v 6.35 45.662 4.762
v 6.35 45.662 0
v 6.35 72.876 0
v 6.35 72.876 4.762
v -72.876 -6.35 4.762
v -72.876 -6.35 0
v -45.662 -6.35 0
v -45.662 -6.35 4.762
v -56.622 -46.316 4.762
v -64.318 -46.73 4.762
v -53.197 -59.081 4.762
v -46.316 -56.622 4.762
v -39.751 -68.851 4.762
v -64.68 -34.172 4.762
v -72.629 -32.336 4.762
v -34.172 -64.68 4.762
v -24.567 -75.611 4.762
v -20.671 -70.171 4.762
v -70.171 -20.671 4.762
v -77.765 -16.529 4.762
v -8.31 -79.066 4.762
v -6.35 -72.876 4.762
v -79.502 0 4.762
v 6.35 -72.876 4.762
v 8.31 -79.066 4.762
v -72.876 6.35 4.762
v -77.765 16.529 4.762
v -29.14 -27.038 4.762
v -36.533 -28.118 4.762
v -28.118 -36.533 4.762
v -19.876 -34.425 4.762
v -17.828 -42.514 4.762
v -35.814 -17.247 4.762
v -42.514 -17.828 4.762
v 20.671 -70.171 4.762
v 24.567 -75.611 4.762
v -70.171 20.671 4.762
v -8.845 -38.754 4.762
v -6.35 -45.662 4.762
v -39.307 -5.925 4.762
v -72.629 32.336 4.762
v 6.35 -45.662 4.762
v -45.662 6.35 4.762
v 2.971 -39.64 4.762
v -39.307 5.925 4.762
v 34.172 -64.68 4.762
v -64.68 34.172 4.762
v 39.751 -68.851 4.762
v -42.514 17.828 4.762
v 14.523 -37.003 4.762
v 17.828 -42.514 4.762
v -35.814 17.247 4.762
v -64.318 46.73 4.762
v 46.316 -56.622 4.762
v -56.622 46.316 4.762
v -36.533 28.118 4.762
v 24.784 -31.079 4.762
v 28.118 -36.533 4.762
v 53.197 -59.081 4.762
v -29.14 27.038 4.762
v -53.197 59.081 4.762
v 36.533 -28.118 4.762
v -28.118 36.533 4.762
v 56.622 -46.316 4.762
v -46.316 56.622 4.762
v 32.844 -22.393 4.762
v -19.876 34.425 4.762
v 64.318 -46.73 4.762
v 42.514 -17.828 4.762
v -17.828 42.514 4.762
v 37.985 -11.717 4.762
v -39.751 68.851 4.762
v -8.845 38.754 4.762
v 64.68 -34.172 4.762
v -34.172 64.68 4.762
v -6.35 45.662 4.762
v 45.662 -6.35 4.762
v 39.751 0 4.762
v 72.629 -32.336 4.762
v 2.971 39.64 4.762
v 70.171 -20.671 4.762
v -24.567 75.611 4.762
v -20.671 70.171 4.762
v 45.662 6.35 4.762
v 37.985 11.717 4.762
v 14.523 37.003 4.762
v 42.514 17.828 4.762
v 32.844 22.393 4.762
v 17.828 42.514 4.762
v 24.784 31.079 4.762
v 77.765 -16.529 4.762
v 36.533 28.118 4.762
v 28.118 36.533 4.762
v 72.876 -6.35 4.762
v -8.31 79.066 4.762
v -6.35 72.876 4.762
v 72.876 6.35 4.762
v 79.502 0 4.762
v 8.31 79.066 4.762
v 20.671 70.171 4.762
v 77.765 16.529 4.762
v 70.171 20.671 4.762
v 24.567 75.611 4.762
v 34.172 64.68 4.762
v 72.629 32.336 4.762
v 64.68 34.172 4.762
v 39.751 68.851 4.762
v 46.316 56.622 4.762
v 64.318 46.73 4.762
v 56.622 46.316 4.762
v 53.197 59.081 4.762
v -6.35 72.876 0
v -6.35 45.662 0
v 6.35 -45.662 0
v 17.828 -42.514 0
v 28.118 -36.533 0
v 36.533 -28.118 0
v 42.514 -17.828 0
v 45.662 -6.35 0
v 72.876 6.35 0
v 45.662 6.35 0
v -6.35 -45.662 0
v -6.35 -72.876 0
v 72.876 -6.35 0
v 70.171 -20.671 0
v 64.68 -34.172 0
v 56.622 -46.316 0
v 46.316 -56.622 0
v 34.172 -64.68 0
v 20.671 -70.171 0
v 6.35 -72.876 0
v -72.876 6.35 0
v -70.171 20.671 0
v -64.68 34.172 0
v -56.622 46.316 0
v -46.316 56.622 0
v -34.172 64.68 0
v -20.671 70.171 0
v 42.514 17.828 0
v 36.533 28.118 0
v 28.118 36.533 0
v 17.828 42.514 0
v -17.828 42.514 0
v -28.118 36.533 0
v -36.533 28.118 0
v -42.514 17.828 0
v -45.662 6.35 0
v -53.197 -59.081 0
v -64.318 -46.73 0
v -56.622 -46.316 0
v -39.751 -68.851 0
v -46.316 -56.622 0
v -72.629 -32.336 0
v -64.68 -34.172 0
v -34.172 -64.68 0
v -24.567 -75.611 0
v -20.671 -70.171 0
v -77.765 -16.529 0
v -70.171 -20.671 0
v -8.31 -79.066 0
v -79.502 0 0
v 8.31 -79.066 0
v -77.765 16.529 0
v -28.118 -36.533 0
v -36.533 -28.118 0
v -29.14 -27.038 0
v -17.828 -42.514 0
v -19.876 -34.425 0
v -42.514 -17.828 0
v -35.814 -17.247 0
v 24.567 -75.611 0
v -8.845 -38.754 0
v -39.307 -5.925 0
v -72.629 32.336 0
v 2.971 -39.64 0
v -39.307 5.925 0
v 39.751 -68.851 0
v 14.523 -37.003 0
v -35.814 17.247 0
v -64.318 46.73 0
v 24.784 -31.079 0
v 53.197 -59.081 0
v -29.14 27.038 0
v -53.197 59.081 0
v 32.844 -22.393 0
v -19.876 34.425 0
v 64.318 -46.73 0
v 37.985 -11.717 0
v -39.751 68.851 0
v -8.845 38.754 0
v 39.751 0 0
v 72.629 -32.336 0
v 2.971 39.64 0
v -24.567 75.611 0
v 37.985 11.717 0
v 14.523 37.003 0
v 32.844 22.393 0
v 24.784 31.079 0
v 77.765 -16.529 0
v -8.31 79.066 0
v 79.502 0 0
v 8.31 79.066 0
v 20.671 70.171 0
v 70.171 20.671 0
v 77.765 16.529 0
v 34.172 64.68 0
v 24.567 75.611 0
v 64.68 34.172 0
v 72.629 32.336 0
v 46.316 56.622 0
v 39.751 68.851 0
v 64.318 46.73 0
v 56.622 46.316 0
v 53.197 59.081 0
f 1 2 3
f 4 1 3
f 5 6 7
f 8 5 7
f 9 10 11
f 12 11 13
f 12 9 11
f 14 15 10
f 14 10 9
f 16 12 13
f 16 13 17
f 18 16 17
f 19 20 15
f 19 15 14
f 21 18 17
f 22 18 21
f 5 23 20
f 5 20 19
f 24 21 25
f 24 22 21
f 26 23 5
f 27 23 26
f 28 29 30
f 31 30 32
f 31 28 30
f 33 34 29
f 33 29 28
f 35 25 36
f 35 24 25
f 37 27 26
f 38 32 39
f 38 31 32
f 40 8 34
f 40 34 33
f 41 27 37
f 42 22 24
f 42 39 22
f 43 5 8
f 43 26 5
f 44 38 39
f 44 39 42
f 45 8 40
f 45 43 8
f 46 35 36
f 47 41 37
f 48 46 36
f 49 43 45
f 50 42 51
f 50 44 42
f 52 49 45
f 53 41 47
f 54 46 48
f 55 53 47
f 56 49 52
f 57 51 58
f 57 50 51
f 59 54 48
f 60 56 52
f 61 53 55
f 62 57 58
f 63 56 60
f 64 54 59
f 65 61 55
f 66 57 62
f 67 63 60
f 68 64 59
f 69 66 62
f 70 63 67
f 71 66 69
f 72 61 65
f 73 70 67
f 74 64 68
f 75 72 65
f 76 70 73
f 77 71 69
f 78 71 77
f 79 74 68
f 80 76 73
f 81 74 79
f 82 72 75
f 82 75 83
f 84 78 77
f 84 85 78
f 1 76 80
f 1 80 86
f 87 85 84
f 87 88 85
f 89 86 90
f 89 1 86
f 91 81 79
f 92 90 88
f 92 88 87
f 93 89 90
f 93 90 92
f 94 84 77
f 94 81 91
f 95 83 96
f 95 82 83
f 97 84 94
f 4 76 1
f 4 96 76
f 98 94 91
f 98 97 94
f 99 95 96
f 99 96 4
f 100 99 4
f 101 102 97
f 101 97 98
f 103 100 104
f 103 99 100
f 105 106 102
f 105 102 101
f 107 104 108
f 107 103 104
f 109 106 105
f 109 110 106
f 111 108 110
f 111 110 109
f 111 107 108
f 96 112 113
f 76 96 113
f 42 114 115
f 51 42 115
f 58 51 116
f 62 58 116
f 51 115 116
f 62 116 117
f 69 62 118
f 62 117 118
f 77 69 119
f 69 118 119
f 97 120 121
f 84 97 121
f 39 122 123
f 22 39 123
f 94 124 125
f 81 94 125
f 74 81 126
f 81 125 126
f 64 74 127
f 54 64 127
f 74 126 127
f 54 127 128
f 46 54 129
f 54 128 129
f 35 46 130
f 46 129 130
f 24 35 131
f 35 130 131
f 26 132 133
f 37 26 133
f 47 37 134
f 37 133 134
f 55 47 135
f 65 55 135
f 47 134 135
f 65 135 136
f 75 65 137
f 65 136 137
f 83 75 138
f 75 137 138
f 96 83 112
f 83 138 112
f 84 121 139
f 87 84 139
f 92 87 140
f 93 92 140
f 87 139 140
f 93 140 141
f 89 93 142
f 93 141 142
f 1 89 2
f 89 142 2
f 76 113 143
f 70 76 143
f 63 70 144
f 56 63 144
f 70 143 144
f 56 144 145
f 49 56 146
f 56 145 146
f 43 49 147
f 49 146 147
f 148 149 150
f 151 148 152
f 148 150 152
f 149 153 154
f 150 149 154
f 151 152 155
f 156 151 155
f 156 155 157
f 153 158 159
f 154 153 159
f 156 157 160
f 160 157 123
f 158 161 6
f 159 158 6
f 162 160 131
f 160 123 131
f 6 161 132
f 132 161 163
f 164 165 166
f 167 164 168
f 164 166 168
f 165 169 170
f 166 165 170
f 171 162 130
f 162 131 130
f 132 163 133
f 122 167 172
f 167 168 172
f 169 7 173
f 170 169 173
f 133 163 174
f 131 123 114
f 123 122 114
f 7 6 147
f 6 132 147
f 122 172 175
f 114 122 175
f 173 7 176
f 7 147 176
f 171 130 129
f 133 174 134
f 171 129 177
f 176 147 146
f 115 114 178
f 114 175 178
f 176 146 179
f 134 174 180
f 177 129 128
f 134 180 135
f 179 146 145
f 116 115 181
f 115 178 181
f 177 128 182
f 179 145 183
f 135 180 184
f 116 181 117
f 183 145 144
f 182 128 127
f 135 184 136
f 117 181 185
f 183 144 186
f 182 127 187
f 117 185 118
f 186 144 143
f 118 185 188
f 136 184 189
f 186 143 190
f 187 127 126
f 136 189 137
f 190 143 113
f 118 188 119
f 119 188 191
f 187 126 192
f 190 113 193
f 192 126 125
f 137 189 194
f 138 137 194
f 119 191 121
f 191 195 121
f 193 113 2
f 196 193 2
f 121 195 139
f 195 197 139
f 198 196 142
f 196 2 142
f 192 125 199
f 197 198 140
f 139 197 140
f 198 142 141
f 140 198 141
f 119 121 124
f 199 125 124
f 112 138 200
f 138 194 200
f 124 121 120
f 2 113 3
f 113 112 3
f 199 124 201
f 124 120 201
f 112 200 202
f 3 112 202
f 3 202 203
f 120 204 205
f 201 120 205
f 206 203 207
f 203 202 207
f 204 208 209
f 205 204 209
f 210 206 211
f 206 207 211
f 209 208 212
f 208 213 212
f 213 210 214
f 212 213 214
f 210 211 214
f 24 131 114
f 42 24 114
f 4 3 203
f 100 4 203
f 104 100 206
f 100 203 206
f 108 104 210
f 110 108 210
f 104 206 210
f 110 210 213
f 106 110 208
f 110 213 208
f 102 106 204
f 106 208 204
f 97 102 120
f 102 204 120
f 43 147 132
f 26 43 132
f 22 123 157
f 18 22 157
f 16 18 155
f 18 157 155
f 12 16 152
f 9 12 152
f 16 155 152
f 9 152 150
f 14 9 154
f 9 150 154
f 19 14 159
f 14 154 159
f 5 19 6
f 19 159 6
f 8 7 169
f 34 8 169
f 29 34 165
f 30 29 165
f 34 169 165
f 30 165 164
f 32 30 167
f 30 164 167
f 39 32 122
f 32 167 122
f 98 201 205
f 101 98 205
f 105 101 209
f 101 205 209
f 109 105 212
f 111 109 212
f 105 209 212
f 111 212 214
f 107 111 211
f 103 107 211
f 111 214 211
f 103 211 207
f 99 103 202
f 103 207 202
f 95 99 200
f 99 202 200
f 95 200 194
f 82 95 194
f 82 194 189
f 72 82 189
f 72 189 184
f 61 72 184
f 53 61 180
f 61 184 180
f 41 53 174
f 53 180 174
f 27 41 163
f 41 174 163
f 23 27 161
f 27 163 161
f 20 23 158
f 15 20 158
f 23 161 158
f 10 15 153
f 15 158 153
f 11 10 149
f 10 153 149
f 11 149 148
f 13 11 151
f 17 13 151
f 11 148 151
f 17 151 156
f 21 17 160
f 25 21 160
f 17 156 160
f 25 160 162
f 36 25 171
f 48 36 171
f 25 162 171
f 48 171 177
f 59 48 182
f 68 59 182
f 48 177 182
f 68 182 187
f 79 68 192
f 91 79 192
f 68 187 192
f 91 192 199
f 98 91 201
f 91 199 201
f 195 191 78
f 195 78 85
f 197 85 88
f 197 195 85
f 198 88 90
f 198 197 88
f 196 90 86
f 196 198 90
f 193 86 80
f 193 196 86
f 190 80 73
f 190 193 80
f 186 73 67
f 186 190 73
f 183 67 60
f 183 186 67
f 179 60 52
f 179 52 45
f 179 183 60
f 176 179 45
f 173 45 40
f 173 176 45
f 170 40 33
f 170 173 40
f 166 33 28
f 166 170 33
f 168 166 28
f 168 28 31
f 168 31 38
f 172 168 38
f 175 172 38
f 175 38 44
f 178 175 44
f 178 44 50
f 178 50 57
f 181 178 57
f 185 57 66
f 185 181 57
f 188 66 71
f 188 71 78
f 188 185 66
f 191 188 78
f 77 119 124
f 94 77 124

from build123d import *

# Parameters (mm, degrees)
SKETCH1_R           = 79.502
SKETCH1_R_2         = 39.751
BOSS_EXTRUDE1_DEPTH = 4.7625


with BuildPart() as part:
    # Sketch1 → Boss-Extrude1 (new body)
    with BuildSketch(Plane.XY):
        Circle(SKETCH1_R)
        with BuildLine():
            Line((-72.875871206, -6.35), (-45.661577951, -6.35))
            ThreePointArc((-45.661577951, -6.35), (-32.598329719, -32.598329719), (-6.35, -45.661577951))
            Line((-6.35, -45.661577951), (-6.35, -72.875871206))
            ThreePointArc((-6.35, -72.875871206), (-51.726275257, -51.726275257), (-72.875871206, -6.35))
        make_face(mode=Mode.SUBTRACT)
        with BuildLine():
            Line((45.661577951, -6.35), (72.875871206, -6.35))
            ThreePointArc((72.875871206, -6.35), (51.726275257, -51.726275257), (6.35, -72.875871206))
            Line((6.35, -72.875871206), (6.35, -45.661577951))
            ThreePointArc((6.35, -45.661577951), (32.598329719, -32.598329719), (45.661577951, -6.35))
        make_face(mode=Mode.SUBTRACT)
        with BuildLine():
            Line((-6.35, 72.875871206), (-6.35, 45.661577951))
            ThreePointArc((-6.35, 45.661577951), (-32.598329719, 32.598329719), (-45.661577951, 6.35))
            Line((-45.661577951, 6.35), (-72.875871206, 6.35))
            ThreePointArc((-72.875871206, 6.35), (-51.726275257, 51.726275257), (-6.35, 72.875871206))
        make_face(mode=Mode.SUBTRACT)
        Circle(SKETCH1_R_2, mode=Mode.SUBTRACT)
        with BuildLine():
            ThreePointArc((45.661577951, 6.35), (32.598329719, 32.598329719), (6.35, 45.661577951))
            Line((6.35, 45.661577951), (6.35, 72.875871206))
            ThreePointArc((6.35, 72.875871206), (51.726275257, 51.726275257), (72.875871206, 6.35))
            Line((72.875871206, 6.35), (45.661577951, 6.35))
        make_face(mode=Mode.SUBTRACT)
    extrude(amount=BOSS_EXTRUDE1_DEPTH)


solid = part.part
